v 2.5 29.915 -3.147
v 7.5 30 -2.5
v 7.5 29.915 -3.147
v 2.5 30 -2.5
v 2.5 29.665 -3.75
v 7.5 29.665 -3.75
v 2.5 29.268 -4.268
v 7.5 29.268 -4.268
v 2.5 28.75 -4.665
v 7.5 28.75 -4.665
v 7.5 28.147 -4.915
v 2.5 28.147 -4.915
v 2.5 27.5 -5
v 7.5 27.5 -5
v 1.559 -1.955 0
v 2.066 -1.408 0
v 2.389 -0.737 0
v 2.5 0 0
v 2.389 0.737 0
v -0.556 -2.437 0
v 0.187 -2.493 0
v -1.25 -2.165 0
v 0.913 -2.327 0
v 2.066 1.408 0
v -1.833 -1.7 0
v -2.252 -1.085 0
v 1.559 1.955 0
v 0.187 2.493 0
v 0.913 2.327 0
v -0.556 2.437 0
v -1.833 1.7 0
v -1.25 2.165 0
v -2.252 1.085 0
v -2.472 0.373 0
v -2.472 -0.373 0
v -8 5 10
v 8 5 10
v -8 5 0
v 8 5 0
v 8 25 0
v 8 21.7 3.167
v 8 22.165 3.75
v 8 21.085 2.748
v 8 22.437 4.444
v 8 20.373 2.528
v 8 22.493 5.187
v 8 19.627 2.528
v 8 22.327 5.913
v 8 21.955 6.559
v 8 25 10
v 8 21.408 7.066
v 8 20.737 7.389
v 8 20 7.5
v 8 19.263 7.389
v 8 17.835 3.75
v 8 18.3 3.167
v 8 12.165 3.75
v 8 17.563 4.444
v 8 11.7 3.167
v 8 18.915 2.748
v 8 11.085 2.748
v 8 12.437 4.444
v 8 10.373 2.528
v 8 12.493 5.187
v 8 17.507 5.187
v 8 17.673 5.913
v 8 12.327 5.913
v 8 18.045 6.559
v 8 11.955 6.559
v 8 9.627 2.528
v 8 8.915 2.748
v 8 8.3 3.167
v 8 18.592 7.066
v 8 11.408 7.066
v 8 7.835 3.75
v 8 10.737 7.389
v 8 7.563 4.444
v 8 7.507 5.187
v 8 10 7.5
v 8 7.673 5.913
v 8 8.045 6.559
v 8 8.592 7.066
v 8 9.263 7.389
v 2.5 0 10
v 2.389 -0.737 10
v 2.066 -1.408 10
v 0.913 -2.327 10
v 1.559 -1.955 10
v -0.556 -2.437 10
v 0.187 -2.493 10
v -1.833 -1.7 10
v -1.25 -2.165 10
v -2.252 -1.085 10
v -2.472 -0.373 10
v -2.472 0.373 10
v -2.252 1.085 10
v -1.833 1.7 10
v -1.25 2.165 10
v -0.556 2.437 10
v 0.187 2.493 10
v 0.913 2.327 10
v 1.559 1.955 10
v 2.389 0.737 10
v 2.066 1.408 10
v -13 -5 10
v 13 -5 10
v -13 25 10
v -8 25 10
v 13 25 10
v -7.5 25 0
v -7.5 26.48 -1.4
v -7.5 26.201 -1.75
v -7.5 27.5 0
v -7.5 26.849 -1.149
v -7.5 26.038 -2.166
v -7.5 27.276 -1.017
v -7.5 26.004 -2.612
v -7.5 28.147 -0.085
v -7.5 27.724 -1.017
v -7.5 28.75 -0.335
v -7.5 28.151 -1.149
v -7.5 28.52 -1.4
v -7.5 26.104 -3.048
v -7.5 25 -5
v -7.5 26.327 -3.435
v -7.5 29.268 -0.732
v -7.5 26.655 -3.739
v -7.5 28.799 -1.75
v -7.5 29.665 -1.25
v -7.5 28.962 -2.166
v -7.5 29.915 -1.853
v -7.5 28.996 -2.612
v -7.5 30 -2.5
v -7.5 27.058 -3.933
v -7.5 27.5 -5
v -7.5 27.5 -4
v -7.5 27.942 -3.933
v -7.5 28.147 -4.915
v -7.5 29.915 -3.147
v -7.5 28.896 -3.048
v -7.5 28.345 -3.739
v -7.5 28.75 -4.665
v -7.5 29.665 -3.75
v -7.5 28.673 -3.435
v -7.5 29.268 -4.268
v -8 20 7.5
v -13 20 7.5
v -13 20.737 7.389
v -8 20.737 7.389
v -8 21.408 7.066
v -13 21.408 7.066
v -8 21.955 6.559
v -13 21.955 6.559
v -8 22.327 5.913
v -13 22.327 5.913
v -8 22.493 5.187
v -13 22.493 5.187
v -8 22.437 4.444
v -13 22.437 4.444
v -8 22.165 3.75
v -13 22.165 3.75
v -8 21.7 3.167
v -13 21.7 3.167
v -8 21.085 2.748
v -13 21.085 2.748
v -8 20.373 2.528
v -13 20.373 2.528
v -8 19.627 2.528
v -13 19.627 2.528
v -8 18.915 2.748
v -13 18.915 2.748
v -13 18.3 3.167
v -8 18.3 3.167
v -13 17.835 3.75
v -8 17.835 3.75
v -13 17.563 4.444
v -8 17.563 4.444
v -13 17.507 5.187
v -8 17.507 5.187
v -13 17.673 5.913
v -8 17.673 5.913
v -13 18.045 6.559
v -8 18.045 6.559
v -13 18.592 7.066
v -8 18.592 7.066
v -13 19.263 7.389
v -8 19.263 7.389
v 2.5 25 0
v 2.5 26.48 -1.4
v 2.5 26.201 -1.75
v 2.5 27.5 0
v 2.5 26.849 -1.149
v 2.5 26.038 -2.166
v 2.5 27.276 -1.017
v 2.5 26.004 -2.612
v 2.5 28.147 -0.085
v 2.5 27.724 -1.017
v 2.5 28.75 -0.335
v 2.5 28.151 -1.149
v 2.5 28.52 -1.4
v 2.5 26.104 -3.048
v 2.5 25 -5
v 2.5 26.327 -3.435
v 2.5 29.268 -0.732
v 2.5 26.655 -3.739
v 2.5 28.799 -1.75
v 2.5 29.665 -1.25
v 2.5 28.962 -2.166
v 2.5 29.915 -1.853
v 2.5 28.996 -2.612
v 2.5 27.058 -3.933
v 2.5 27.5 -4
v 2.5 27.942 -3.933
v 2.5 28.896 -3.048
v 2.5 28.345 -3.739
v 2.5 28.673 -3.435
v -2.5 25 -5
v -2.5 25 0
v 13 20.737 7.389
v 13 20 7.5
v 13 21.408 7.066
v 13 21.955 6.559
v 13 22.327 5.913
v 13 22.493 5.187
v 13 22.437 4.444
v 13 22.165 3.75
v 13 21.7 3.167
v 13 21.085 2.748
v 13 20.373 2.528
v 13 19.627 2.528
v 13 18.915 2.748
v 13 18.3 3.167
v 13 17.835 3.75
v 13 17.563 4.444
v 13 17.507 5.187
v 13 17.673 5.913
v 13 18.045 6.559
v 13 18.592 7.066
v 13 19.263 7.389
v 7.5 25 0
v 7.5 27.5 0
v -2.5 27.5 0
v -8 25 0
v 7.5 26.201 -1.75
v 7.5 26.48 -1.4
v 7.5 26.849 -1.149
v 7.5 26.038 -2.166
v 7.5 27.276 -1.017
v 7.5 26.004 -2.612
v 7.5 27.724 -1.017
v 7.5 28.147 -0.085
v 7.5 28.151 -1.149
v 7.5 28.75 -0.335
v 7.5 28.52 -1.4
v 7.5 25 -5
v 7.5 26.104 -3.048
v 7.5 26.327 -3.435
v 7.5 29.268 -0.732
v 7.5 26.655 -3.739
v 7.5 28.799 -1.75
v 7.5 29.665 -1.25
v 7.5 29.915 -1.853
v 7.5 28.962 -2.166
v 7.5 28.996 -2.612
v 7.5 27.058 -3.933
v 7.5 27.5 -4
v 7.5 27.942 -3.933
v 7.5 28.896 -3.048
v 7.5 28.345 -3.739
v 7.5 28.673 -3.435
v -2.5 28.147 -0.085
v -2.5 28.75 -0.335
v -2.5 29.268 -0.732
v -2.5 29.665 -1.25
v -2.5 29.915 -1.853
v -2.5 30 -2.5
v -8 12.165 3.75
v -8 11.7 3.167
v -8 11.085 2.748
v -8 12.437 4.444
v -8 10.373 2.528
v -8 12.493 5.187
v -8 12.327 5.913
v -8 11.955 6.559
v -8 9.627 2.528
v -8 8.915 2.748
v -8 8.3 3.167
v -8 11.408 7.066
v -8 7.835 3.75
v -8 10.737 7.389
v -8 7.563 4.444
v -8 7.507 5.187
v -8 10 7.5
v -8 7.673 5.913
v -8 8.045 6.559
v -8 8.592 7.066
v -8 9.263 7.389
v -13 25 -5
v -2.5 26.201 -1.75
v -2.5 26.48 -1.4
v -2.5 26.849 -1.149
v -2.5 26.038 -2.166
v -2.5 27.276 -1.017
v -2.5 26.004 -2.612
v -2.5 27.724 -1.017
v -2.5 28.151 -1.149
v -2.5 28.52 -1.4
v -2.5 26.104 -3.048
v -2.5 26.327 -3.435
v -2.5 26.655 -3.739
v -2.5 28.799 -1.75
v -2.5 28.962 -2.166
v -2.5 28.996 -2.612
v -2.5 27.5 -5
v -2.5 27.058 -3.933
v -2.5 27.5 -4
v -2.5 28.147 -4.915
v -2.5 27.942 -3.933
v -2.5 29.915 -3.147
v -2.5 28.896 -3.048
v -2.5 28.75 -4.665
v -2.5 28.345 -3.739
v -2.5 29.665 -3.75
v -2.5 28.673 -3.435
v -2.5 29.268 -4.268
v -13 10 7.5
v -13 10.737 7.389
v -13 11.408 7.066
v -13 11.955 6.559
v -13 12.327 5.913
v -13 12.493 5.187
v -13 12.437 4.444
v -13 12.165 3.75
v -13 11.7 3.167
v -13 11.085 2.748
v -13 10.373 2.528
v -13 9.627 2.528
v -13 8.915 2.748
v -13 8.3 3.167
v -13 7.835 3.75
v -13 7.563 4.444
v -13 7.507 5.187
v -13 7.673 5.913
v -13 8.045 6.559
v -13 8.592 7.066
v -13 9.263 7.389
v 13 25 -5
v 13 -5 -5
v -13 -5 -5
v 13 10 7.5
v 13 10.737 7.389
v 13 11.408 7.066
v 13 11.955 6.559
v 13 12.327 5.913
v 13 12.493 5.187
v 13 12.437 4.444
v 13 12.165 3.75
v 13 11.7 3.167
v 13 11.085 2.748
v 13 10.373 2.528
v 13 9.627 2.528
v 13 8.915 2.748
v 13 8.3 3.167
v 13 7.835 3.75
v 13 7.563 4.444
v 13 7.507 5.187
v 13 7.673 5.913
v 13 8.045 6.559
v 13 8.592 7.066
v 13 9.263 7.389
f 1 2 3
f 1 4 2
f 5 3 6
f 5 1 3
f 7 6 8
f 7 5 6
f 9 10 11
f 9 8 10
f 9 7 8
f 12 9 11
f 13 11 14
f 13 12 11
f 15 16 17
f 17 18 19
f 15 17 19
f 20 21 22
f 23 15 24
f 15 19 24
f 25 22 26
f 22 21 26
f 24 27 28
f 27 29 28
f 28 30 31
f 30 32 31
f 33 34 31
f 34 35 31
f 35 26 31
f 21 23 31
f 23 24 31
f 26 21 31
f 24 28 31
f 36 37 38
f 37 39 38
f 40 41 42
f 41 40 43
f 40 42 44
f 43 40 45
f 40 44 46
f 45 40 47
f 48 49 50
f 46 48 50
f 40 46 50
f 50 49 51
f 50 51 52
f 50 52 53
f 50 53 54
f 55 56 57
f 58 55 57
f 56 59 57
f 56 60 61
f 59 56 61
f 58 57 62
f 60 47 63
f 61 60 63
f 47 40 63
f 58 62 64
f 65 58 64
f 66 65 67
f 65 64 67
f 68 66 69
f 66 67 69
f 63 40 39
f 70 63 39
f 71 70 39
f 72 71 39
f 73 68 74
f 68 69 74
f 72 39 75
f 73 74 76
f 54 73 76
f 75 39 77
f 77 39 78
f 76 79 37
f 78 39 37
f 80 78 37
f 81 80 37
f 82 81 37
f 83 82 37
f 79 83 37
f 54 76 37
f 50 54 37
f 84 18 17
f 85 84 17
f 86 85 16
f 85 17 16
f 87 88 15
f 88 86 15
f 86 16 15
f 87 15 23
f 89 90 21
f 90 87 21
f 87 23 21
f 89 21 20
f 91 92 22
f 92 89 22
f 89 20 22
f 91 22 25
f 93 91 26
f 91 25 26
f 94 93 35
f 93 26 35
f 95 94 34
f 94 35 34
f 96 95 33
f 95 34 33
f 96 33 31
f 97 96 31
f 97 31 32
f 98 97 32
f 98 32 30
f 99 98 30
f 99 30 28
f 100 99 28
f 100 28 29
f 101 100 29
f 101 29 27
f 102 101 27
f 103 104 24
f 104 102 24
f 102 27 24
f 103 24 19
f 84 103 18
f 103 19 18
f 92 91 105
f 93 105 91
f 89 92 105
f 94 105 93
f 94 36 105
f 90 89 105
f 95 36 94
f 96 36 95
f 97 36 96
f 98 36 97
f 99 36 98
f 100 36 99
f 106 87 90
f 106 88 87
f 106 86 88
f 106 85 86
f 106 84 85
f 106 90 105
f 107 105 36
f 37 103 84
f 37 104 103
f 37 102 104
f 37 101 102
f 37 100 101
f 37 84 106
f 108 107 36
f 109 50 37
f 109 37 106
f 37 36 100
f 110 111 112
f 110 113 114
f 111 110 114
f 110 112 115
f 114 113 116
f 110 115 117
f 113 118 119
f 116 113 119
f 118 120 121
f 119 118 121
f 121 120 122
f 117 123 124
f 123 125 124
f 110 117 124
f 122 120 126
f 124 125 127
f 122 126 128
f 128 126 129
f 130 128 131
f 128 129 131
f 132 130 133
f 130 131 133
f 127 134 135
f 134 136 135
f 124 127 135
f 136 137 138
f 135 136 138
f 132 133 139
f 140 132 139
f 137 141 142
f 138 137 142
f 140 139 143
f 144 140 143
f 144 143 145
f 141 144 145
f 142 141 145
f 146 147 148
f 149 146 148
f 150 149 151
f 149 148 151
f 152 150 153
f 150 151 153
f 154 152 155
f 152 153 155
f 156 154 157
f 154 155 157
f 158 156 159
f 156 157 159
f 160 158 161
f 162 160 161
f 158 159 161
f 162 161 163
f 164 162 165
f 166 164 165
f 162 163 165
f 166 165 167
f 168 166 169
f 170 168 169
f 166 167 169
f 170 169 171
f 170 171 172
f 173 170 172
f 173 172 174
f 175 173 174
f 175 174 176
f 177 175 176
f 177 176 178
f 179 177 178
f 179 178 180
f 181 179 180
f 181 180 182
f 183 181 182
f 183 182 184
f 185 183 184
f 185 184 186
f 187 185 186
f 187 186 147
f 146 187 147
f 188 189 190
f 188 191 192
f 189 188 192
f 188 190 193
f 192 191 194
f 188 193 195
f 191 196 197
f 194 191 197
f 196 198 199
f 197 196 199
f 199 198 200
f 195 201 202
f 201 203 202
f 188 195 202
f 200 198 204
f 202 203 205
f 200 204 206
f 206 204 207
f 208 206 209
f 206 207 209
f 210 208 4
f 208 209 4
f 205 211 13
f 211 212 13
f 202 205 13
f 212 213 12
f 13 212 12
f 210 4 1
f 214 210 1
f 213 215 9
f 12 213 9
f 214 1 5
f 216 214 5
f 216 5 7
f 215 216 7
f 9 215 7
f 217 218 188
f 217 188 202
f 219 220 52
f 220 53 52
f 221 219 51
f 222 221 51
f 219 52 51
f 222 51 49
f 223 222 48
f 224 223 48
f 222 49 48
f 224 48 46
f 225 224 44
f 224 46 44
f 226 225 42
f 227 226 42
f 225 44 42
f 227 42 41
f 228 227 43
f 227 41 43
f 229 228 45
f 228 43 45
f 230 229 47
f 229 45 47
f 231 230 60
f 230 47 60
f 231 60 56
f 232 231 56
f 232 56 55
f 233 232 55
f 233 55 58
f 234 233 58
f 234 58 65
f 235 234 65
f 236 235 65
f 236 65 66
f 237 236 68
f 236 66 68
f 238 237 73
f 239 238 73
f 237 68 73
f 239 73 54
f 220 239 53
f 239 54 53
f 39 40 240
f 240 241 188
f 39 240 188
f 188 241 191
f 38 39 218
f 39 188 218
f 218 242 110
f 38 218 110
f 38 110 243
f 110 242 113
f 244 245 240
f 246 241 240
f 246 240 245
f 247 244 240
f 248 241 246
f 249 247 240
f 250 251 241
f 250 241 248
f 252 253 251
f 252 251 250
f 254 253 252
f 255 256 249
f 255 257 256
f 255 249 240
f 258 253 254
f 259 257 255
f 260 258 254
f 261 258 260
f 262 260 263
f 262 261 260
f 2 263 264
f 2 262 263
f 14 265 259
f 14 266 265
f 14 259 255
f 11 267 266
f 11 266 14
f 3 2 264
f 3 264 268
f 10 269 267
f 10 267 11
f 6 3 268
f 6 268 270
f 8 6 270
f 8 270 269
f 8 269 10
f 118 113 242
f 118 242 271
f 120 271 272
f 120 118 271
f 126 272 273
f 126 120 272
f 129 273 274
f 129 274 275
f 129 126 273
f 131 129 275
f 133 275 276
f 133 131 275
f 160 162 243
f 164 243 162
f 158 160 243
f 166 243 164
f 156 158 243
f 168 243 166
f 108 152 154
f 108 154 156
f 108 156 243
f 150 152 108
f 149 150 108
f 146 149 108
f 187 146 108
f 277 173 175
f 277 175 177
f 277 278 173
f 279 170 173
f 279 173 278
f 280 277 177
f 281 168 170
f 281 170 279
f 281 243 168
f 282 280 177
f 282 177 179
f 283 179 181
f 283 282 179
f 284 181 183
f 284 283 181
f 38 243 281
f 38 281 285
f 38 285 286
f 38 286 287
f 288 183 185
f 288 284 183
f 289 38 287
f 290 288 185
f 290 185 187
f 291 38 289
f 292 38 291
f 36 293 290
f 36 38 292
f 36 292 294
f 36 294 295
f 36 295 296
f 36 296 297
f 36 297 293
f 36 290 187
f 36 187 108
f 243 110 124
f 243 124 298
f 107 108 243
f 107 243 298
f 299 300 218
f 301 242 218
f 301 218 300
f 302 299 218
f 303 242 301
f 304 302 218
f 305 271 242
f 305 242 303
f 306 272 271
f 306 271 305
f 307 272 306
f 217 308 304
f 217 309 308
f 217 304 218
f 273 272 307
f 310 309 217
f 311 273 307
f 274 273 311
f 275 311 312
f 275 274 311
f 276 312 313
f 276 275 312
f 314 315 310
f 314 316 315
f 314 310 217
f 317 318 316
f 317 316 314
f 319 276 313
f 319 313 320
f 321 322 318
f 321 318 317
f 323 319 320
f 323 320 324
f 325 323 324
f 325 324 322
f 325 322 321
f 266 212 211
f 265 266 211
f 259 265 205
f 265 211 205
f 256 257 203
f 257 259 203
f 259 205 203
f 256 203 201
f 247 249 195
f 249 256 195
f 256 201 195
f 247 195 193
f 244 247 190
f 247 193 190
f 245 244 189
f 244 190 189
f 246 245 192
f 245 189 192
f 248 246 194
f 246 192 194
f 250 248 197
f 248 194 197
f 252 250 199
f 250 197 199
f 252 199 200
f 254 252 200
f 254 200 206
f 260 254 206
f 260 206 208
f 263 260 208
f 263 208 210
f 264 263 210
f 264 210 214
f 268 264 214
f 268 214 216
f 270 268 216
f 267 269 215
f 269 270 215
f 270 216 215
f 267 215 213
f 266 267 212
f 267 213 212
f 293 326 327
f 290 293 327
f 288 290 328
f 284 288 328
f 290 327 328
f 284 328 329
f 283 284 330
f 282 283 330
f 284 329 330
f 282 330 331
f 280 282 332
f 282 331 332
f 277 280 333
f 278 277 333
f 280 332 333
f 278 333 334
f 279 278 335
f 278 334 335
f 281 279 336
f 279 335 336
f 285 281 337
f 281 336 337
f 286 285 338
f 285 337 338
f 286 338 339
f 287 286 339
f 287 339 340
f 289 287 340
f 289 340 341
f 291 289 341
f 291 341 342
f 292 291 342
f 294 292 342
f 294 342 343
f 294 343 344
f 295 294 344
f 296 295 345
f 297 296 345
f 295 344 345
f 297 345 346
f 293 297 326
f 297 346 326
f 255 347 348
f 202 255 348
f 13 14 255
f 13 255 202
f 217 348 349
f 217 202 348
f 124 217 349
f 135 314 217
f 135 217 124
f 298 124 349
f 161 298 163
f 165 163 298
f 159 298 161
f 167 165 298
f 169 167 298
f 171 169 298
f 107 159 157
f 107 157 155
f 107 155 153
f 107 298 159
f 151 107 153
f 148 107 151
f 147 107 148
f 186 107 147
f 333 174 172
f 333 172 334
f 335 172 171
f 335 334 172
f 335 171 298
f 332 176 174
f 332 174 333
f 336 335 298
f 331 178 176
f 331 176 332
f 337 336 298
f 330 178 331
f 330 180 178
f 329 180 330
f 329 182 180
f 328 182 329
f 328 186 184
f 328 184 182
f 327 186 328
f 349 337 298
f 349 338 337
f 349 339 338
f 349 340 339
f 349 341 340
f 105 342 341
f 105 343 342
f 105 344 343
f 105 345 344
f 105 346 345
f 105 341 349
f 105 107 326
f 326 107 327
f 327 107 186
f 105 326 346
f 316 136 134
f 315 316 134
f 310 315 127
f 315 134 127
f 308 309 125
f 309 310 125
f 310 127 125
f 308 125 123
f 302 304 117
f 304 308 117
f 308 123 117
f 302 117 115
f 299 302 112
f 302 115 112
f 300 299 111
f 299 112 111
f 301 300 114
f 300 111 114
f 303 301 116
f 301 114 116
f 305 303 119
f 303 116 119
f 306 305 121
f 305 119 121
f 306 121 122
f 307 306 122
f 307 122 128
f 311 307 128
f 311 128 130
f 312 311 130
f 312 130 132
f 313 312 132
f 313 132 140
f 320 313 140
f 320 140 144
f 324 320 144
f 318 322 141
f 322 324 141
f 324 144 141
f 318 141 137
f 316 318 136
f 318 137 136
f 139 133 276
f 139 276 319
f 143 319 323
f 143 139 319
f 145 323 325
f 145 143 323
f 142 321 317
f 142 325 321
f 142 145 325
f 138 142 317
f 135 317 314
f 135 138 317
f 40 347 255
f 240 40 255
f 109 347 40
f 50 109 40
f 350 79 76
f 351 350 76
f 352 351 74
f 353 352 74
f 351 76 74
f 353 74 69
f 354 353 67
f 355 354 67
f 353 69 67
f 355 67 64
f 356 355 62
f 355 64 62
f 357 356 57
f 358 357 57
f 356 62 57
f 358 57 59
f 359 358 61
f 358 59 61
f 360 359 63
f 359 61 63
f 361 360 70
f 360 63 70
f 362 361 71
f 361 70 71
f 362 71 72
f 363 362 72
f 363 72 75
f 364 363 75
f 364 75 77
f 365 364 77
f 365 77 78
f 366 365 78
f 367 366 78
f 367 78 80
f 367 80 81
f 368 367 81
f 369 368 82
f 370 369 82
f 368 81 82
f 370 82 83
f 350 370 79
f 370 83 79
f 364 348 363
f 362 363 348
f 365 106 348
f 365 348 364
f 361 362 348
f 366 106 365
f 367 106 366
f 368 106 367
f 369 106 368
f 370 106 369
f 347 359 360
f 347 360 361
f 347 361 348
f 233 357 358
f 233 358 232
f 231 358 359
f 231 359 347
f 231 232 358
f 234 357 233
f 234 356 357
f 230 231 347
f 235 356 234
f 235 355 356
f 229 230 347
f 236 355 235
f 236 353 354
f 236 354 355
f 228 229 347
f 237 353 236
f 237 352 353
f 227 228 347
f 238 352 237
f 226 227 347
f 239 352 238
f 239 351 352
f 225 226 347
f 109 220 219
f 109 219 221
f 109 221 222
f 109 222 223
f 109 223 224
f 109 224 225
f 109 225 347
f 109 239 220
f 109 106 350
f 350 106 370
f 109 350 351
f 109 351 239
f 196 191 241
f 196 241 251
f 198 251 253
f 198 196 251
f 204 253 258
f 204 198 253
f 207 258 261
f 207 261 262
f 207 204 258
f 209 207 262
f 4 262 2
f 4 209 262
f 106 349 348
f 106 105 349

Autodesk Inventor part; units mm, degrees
ref_plane "YZ Plane" through (0, 0, 0) normal (1, 0, 0) x (0, 1, 0)
sketch "스케치1" plane through (0, 0, 0) normal (0, 0, 1) x (1, 0, 0)
  line L0 (-13, -5) -> (13, -5)
  line L1 (13, -5) -> (13, 5)
  line L2 (13, 5) -> (-13, 5)
  line L3 (-13, 5) -> (-13, -5)
  line L4 (-13, -5) -> (13, 5) construction
  line L5 (13, -5) -> (-13, 5) construction
  circle A0 centre (0, 0) radius 2.5
  dimension "d0" = 26
  dimension "d1" = 10
  dimension "d2" = 5
extrude "돌출1" add sketch "스케치1" along normal blind 10
sketch "스케치2" plane through (-13, 5, 0) normal (0, 1, 0) x (1, 0, 0)
  line L0 (26, 0) -> (0, 0) projected
  line L1 (26, -10) -> (0, -10) projected
  line L2 (0, 0) -> (5, 0)
  line L3 (5, 0) -> (5, -10)
  line L4 (5, -10) -> (0, -10)
  line L5 (0, -10) -> (0, 0)
  line L6 (13, 0) -> (13, -10)
  line L7 (26, 0) -> (21, 0)
  line L8 (21, 0) -> (21, -10)
  line L9 (21, -10) -> (26, -10)
  line L10 (26, -10) -> (26, 0)
  point P0 (0, -10)
  point P1 (21, 0)
  dimension "d5" = 5
  dimension "d6" = 8
extrude "돌출2" add sketch "스케치2" along normal blind 10 contours L10 L1 L8 L0 | L3 L1 L5 L0
sketch "스케치3" plane through (-13, 5, 0) normal (-1, 0, 0) x (0, 0, 1)
  circle A0 centre (5, 5) radius 2.5
  line L0 (0, 10) -> (10, 10) projected
  line L1 (10, -10) -> (10, 10) projected
  point P0 (0, -5)
  point P1 (10, 0)
  point P2 (10, 5)
  point P3 (5, 10)
  point P4 (5, 10)
  dimension "d9" = 5
extrude "돌출3" cut sketch "스케치3" against normal through all
ref_plane "작업 평면1" through (-13, 15, 0) normal (0, 1, 0) x (1, 0, 0)
mirror "미러1" about plane through (-10.5, 15, 5) normal (0, 1, 0) of "돌출3", "돌출2"
sketch "스케치4" plane through (0, 0, 0) normal (0, 0, -1) x (-1, 0, 0)
  line L0 (-13, 5) -> (-13, 25) projected
  line L1 (13, -5) -> (-13, -5) projected
  line L2 (-13, 25) -> (13, 25)
  line L3 (13, 25) -> (13, -5)
  line L4 (13, -5) -> (-13, -5)
  line L5 (-13, -5) -> (-13, 25)
  point P0 (0, 0)
  point P1 (13, 25)
extrude "돌출4" add sketch "스케치4" along normal blind 5
ref_plane "작업 평면2" through (0, -5, 10) normal (1, 0, 0) x (0, 0, -1)
sketch "스케치5" plane through (0, -5, 10) normal (1, 0, 0) x (0, 0, -1)
  line L0 (10, 10) -> (10, 30) projected
  line L1 (10, 30) -> (15, 30)
  line L2 (15, 30) -> (15, 35)
  line L3 (15, 35) -> (10, 35)
  line L4 (10, 35) -> (10, 30)
  circle A0 centre (12.5, 32.5) radius 1.5
  point P0 (10, 5)
  point P1 (10, 32.5)
  point P2 (12.5, 35)
  dimension "d16" = 5
  dimension "d19" = 3
extrude "돌출5" add sketch "스케치5" along normal mid plane 15
extrude "돌출6" cut sketch "스케치5" along normal mid plane 5
fillet "모깎기2" radius 2.5 4 edges at (-5, 30, -5) (-5, 30, 0) (5, 30, -5) (5, 30, 0)
properties part number "SteeringFrame"
